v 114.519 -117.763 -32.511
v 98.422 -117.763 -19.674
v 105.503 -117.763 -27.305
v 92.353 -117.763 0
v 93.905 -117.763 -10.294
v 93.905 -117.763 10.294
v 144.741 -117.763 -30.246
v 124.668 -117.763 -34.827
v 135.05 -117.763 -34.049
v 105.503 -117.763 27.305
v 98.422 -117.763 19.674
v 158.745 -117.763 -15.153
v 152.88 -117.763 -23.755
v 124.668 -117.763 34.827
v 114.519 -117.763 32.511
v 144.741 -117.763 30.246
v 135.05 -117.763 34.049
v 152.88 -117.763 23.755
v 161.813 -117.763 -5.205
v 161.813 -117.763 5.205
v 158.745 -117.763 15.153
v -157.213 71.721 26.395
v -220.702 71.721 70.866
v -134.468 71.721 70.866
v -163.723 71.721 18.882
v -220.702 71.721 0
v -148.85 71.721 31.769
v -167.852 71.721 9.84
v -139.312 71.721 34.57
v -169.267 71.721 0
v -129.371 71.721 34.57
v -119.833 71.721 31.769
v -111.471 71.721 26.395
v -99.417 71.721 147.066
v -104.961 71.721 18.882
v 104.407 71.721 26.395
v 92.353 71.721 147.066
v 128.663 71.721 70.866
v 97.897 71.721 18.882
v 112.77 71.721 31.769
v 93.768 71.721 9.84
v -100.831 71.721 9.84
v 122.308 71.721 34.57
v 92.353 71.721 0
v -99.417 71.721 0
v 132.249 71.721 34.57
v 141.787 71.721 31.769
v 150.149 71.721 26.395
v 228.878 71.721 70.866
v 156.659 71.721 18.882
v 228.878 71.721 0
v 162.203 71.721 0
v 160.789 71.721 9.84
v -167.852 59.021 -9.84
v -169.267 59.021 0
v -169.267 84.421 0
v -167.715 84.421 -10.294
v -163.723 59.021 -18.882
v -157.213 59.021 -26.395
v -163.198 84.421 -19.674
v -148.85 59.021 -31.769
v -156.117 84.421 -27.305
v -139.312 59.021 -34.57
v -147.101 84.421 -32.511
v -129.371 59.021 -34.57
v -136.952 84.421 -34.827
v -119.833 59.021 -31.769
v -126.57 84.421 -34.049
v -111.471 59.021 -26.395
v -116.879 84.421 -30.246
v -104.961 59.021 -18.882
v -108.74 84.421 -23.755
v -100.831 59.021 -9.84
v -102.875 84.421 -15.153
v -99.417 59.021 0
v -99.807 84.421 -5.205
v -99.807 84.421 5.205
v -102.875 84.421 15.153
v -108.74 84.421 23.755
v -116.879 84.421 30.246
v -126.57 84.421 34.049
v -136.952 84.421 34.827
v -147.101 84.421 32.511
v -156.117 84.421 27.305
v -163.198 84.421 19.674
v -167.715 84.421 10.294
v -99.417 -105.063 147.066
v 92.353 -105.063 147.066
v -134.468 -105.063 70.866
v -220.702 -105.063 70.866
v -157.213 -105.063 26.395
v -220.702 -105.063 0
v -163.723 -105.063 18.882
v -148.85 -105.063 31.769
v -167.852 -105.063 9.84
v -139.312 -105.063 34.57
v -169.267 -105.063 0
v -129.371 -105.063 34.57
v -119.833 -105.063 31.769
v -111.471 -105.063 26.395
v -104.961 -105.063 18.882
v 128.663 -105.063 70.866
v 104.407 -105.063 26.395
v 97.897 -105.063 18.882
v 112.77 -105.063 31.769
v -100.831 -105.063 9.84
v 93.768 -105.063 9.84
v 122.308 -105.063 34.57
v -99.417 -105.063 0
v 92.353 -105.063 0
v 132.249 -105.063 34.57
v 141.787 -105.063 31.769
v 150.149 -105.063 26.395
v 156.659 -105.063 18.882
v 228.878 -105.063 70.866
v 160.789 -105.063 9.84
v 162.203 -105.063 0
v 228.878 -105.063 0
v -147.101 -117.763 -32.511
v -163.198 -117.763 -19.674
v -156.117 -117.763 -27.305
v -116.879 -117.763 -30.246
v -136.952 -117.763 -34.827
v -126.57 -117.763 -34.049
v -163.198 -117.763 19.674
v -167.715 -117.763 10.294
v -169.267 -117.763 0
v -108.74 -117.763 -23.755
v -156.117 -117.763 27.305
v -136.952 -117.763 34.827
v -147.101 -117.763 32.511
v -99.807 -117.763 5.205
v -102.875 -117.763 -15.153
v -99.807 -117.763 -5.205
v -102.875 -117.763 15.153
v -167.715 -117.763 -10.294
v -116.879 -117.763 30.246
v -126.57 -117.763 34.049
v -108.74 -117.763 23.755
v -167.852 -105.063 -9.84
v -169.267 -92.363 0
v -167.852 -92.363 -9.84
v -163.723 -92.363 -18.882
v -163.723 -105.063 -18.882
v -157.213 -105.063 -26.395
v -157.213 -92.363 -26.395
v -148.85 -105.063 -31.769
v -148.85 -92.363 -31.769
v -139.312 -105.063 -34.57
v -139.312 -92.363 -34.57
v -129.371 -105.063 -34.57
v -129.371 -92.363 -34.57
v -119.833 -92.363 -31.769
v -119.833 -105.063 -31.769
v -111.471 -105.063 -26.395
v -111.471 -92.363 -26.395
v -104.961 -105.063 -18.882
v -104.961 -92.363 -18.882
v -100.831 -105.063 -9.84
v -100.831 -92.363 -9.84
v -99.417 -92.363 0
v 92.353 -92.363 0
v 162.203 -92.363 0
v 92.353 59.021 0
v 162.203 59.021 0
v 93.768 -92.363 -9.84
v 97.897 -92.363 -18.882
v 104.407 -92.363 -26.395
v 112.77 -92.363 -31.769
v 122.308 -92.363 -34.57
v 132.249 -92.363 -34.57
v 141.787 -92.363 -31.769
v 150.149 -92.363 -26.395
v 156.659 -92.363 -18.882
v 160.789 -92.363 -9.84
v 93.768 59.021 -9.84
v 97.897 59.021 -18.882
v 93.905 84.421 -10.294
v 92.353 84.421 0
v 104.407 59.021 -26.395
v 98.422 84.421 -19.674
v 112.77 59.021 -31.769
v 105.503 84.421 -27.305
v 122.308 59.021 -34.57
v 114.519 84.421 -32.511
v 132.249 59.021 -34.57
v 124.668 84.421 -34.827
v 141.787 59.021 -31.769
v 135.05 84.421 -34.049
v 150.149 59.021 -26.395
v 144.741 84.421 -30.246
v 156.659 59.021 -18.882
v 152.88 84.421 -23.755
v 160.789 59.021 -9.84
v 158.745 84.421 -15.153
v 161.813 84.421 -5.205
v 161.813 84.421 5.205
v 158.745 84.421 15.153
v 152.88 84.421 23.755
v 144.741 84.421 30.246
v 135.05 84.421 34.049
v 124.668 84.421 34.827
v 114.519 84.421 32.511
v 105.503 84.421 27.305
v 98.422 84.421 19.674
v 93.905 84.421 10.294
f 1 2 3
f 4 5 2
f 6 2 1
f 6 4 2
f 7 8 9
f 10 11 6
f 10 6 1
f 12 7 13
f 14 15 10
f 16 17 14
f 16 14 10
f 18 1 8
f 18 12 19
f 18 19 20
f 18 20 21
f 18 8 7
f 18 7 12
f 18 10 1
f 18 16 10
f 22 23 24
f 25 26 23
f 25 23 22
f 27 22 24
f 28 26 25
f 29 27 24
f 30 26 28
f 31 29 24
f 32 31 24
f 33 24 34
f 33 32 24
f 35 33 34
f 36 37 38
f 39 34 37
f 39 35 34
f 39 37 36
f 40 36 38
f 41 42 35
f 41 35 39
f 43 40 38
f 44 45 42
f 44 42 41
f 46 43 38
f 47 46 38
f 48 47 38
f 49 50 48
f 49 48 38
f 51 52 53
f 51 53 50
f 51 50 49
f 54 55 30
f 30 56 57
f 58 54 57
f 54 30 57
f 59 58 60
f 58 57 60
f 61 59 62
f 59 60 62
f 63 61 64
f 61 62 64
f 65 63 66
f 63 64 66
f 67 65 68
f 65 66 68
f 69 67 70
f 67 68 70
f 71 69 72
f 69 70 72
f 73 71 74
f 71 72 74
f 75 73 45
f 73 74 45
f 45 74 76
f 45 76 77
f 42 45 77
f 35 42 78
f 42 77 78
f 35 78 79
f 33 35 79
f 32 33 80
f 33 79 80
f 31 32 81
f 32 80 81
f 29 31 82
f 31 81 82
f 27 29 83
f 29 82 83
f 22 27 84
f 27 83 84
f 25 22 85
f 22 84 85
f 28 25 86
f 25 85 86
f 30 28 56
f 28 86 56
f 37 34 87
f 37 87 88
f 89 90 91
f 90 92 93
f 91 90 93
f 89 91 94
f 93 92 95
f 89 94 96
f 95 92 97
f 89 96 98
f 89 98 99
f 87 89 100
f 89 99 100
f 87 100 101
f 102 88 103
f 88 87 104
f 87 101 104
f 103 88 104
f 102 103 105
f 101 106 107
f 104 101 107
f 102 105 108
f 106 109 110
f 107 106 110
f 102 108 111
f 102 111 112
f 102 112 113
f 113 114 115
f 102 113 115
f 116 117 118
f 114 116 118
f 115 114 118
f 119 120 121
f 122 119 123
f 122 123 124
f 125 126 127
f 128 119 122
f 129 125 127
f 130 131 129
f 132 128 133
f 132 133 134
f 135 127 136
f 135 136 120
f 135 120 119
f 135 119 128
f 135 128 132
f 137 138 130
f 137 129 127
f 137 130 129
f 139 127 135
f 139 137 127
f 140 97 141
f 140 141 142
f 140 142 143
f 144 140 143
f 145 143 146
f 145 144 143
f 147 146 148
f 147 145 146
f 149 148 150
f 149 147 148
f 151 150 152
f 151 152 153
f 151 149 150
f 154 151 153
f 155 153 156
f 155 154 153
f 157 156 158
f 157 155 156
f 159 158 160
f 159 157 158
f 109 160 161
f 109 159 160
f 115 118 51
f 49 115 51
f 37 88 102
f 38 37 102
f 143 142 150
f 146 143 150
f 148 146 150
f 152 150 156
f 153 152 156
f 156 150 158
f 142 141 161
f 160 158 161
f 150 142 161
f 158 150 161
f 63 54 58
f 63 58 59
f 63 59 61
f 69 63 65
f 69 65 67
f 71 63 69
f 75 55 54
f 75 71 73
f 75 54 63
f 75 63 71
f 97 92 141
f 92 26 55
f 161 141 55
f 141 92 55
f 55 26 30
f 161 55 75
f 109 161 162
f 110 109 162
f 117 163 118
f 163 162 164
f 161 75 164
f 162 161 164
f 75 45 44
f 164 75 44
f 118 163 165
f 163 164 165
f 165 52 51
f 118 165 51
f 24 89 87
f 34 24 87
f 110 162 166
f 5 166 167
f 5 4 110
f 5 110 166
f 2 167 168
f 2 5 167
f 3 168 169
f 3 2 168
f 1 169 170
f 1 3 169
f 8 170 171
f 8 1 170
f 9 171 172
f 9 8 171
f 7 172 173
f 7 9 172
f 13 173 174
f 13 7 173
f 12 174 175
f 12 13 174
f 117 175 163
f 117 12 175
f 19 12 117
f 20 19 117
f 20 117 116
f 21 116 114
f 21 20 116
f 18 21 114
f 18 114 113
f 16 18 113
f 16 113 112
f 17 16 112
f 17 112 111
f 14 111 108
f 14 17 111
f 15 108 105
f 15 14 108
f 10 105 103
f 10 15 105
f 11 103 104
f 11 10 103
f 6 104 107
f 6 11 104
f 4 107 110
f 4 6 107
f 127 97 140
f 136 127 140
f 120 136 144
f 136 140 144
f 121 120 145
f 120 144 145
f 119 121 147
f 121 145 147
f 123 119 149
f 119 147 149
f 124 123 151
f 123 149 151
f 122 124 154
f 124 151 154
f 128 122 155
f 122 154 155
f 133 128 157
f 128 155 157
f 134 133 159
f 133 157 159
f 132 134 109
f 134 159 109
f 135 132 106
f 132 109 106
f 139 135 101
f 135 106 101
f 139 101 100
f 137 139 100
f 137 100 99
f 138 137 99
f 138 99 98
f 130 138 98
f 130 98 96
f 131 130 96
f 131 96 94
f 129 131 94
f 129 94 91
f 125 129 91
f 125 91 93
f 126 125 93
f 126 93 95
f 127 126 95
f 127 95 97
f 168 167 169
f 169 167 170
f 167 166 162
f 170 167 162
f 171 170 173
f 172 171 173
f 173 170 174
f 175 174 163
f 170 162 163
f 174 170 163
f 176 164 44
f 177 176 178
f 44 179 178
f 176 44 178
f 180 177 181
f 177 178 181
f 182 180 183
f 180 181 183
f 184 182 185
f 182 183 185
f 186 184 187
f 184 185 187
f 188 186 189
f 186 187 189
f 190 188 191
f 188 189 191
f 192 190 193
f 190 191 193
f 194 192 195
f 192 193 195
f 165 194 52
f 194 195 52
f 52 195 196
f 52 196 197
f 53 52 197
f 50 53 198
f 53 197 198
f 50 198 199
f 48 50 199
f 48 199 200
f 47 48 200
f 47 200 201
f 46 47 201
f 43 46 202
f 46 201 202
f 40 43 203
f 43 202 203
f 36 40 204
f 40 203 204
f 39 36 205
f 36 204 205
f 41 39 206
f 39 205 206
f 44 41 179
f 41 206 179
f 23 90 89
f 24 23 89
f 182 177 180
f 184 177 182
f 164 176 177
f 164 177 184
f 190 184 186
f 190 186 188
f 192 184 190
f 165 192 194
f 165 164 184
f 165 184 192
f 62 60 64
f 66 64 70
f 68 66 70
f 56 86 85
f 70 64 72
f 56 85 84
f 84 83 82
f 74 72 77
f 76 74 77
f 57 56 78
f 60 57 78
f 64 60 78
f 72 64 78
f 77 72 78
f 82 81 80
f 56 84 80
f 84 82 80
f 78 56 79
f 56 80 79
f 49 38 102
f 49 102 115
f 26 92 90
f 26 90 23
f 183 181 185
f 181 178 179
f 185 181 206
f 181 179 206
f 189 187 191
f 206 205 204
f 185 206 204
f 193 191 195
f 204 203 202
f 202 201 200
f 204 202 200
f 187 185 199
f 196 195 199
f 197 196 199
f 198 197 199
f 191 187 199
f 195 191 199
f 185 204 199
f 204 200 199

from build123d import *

# Parameters (mm, degrees)
F0_W     = 449.58
F0_H     = 176.784
F1_DEPTH = 70.866
F3_DEPTH = 12.7
F6_W     = 263.13141
F6_H     = 176.784
F7_DEPTH = 76.2
F9_DEPTH = 189.485


with BuildPart() as f1:
    # F0 (on Top) → F1 (new body)
    with BuildSketch(Plane.XY):
        with Locations((4.088245, -16.670767)):
            Rectangle(F0_W, F0_H)
    extrude(amount=F1_DEPTH)

    # F2 (on face) → F3 (join, symmetric)
    with BuildSketch(Plane.XZ.offset(105.062767)):
        with BuildLine():
            Line((-169.266755, 0), (-99.416755, 0))
            ThreePointArc((-99.416755, 0), (-134.341755, 34.925), (-169.266755, 0))
        make_face()
        with BuildLine():
            ThreePointArc((-169.266755, 0), (-134.341755, -34.925), (-99.416755, 0))
            Line((-99.416755, 0), (-169.266755, 0))
        make_face()
        with BuildLine():
            ThreePointArc((162.203245, 0), (127.278245, 34.925), (92.353245, 0))
            Line((92.353245, 0), (162.203245, 0))
        make_face()
        with BuildLine():
            Line((162.203245, 0), (92.353245, 0))
            ThreePointArc((92.353245, 0), (127.278245, -34.925), (162.203245, 0))
        make_face()
    extrude(amount=F3_DEPTH, both=True)

    # F5: F1 across plane


with BuildPart() as f1_1:
    add(f1.part)
    add(f1.part.mirror(Plane(origin=(5.13005, -16.670767, 38.250844), x_dir=(1, 0, 0), z_dir=(0, -1, 0))))

    # F6 (on face) → F7 (join)
    with BuildSketch(Plane.XY.offset(70.866)):
        with Locations((-2.902493, -16.670767)):
            Rectangle(F6_W, F6_H)
    extrude(amount=F7_DEPTH)

    # F8 (on face) → F9 (cut, through all)
    with BuildSketch(Plane.XZ.offset(105.062767)):
        Polygon((-134.468198, 147.066), (-134.468198, 70.866), (-99.416755, 147.066), align=None)
        Polygon((128.663212, 147.066), (92.353245, 147.066), (128.663212, 70.866), align=None)
    extrude(amount=-F9_DEPTH, mode=Mode.SUBTRACT)


solid = f1_1.part
